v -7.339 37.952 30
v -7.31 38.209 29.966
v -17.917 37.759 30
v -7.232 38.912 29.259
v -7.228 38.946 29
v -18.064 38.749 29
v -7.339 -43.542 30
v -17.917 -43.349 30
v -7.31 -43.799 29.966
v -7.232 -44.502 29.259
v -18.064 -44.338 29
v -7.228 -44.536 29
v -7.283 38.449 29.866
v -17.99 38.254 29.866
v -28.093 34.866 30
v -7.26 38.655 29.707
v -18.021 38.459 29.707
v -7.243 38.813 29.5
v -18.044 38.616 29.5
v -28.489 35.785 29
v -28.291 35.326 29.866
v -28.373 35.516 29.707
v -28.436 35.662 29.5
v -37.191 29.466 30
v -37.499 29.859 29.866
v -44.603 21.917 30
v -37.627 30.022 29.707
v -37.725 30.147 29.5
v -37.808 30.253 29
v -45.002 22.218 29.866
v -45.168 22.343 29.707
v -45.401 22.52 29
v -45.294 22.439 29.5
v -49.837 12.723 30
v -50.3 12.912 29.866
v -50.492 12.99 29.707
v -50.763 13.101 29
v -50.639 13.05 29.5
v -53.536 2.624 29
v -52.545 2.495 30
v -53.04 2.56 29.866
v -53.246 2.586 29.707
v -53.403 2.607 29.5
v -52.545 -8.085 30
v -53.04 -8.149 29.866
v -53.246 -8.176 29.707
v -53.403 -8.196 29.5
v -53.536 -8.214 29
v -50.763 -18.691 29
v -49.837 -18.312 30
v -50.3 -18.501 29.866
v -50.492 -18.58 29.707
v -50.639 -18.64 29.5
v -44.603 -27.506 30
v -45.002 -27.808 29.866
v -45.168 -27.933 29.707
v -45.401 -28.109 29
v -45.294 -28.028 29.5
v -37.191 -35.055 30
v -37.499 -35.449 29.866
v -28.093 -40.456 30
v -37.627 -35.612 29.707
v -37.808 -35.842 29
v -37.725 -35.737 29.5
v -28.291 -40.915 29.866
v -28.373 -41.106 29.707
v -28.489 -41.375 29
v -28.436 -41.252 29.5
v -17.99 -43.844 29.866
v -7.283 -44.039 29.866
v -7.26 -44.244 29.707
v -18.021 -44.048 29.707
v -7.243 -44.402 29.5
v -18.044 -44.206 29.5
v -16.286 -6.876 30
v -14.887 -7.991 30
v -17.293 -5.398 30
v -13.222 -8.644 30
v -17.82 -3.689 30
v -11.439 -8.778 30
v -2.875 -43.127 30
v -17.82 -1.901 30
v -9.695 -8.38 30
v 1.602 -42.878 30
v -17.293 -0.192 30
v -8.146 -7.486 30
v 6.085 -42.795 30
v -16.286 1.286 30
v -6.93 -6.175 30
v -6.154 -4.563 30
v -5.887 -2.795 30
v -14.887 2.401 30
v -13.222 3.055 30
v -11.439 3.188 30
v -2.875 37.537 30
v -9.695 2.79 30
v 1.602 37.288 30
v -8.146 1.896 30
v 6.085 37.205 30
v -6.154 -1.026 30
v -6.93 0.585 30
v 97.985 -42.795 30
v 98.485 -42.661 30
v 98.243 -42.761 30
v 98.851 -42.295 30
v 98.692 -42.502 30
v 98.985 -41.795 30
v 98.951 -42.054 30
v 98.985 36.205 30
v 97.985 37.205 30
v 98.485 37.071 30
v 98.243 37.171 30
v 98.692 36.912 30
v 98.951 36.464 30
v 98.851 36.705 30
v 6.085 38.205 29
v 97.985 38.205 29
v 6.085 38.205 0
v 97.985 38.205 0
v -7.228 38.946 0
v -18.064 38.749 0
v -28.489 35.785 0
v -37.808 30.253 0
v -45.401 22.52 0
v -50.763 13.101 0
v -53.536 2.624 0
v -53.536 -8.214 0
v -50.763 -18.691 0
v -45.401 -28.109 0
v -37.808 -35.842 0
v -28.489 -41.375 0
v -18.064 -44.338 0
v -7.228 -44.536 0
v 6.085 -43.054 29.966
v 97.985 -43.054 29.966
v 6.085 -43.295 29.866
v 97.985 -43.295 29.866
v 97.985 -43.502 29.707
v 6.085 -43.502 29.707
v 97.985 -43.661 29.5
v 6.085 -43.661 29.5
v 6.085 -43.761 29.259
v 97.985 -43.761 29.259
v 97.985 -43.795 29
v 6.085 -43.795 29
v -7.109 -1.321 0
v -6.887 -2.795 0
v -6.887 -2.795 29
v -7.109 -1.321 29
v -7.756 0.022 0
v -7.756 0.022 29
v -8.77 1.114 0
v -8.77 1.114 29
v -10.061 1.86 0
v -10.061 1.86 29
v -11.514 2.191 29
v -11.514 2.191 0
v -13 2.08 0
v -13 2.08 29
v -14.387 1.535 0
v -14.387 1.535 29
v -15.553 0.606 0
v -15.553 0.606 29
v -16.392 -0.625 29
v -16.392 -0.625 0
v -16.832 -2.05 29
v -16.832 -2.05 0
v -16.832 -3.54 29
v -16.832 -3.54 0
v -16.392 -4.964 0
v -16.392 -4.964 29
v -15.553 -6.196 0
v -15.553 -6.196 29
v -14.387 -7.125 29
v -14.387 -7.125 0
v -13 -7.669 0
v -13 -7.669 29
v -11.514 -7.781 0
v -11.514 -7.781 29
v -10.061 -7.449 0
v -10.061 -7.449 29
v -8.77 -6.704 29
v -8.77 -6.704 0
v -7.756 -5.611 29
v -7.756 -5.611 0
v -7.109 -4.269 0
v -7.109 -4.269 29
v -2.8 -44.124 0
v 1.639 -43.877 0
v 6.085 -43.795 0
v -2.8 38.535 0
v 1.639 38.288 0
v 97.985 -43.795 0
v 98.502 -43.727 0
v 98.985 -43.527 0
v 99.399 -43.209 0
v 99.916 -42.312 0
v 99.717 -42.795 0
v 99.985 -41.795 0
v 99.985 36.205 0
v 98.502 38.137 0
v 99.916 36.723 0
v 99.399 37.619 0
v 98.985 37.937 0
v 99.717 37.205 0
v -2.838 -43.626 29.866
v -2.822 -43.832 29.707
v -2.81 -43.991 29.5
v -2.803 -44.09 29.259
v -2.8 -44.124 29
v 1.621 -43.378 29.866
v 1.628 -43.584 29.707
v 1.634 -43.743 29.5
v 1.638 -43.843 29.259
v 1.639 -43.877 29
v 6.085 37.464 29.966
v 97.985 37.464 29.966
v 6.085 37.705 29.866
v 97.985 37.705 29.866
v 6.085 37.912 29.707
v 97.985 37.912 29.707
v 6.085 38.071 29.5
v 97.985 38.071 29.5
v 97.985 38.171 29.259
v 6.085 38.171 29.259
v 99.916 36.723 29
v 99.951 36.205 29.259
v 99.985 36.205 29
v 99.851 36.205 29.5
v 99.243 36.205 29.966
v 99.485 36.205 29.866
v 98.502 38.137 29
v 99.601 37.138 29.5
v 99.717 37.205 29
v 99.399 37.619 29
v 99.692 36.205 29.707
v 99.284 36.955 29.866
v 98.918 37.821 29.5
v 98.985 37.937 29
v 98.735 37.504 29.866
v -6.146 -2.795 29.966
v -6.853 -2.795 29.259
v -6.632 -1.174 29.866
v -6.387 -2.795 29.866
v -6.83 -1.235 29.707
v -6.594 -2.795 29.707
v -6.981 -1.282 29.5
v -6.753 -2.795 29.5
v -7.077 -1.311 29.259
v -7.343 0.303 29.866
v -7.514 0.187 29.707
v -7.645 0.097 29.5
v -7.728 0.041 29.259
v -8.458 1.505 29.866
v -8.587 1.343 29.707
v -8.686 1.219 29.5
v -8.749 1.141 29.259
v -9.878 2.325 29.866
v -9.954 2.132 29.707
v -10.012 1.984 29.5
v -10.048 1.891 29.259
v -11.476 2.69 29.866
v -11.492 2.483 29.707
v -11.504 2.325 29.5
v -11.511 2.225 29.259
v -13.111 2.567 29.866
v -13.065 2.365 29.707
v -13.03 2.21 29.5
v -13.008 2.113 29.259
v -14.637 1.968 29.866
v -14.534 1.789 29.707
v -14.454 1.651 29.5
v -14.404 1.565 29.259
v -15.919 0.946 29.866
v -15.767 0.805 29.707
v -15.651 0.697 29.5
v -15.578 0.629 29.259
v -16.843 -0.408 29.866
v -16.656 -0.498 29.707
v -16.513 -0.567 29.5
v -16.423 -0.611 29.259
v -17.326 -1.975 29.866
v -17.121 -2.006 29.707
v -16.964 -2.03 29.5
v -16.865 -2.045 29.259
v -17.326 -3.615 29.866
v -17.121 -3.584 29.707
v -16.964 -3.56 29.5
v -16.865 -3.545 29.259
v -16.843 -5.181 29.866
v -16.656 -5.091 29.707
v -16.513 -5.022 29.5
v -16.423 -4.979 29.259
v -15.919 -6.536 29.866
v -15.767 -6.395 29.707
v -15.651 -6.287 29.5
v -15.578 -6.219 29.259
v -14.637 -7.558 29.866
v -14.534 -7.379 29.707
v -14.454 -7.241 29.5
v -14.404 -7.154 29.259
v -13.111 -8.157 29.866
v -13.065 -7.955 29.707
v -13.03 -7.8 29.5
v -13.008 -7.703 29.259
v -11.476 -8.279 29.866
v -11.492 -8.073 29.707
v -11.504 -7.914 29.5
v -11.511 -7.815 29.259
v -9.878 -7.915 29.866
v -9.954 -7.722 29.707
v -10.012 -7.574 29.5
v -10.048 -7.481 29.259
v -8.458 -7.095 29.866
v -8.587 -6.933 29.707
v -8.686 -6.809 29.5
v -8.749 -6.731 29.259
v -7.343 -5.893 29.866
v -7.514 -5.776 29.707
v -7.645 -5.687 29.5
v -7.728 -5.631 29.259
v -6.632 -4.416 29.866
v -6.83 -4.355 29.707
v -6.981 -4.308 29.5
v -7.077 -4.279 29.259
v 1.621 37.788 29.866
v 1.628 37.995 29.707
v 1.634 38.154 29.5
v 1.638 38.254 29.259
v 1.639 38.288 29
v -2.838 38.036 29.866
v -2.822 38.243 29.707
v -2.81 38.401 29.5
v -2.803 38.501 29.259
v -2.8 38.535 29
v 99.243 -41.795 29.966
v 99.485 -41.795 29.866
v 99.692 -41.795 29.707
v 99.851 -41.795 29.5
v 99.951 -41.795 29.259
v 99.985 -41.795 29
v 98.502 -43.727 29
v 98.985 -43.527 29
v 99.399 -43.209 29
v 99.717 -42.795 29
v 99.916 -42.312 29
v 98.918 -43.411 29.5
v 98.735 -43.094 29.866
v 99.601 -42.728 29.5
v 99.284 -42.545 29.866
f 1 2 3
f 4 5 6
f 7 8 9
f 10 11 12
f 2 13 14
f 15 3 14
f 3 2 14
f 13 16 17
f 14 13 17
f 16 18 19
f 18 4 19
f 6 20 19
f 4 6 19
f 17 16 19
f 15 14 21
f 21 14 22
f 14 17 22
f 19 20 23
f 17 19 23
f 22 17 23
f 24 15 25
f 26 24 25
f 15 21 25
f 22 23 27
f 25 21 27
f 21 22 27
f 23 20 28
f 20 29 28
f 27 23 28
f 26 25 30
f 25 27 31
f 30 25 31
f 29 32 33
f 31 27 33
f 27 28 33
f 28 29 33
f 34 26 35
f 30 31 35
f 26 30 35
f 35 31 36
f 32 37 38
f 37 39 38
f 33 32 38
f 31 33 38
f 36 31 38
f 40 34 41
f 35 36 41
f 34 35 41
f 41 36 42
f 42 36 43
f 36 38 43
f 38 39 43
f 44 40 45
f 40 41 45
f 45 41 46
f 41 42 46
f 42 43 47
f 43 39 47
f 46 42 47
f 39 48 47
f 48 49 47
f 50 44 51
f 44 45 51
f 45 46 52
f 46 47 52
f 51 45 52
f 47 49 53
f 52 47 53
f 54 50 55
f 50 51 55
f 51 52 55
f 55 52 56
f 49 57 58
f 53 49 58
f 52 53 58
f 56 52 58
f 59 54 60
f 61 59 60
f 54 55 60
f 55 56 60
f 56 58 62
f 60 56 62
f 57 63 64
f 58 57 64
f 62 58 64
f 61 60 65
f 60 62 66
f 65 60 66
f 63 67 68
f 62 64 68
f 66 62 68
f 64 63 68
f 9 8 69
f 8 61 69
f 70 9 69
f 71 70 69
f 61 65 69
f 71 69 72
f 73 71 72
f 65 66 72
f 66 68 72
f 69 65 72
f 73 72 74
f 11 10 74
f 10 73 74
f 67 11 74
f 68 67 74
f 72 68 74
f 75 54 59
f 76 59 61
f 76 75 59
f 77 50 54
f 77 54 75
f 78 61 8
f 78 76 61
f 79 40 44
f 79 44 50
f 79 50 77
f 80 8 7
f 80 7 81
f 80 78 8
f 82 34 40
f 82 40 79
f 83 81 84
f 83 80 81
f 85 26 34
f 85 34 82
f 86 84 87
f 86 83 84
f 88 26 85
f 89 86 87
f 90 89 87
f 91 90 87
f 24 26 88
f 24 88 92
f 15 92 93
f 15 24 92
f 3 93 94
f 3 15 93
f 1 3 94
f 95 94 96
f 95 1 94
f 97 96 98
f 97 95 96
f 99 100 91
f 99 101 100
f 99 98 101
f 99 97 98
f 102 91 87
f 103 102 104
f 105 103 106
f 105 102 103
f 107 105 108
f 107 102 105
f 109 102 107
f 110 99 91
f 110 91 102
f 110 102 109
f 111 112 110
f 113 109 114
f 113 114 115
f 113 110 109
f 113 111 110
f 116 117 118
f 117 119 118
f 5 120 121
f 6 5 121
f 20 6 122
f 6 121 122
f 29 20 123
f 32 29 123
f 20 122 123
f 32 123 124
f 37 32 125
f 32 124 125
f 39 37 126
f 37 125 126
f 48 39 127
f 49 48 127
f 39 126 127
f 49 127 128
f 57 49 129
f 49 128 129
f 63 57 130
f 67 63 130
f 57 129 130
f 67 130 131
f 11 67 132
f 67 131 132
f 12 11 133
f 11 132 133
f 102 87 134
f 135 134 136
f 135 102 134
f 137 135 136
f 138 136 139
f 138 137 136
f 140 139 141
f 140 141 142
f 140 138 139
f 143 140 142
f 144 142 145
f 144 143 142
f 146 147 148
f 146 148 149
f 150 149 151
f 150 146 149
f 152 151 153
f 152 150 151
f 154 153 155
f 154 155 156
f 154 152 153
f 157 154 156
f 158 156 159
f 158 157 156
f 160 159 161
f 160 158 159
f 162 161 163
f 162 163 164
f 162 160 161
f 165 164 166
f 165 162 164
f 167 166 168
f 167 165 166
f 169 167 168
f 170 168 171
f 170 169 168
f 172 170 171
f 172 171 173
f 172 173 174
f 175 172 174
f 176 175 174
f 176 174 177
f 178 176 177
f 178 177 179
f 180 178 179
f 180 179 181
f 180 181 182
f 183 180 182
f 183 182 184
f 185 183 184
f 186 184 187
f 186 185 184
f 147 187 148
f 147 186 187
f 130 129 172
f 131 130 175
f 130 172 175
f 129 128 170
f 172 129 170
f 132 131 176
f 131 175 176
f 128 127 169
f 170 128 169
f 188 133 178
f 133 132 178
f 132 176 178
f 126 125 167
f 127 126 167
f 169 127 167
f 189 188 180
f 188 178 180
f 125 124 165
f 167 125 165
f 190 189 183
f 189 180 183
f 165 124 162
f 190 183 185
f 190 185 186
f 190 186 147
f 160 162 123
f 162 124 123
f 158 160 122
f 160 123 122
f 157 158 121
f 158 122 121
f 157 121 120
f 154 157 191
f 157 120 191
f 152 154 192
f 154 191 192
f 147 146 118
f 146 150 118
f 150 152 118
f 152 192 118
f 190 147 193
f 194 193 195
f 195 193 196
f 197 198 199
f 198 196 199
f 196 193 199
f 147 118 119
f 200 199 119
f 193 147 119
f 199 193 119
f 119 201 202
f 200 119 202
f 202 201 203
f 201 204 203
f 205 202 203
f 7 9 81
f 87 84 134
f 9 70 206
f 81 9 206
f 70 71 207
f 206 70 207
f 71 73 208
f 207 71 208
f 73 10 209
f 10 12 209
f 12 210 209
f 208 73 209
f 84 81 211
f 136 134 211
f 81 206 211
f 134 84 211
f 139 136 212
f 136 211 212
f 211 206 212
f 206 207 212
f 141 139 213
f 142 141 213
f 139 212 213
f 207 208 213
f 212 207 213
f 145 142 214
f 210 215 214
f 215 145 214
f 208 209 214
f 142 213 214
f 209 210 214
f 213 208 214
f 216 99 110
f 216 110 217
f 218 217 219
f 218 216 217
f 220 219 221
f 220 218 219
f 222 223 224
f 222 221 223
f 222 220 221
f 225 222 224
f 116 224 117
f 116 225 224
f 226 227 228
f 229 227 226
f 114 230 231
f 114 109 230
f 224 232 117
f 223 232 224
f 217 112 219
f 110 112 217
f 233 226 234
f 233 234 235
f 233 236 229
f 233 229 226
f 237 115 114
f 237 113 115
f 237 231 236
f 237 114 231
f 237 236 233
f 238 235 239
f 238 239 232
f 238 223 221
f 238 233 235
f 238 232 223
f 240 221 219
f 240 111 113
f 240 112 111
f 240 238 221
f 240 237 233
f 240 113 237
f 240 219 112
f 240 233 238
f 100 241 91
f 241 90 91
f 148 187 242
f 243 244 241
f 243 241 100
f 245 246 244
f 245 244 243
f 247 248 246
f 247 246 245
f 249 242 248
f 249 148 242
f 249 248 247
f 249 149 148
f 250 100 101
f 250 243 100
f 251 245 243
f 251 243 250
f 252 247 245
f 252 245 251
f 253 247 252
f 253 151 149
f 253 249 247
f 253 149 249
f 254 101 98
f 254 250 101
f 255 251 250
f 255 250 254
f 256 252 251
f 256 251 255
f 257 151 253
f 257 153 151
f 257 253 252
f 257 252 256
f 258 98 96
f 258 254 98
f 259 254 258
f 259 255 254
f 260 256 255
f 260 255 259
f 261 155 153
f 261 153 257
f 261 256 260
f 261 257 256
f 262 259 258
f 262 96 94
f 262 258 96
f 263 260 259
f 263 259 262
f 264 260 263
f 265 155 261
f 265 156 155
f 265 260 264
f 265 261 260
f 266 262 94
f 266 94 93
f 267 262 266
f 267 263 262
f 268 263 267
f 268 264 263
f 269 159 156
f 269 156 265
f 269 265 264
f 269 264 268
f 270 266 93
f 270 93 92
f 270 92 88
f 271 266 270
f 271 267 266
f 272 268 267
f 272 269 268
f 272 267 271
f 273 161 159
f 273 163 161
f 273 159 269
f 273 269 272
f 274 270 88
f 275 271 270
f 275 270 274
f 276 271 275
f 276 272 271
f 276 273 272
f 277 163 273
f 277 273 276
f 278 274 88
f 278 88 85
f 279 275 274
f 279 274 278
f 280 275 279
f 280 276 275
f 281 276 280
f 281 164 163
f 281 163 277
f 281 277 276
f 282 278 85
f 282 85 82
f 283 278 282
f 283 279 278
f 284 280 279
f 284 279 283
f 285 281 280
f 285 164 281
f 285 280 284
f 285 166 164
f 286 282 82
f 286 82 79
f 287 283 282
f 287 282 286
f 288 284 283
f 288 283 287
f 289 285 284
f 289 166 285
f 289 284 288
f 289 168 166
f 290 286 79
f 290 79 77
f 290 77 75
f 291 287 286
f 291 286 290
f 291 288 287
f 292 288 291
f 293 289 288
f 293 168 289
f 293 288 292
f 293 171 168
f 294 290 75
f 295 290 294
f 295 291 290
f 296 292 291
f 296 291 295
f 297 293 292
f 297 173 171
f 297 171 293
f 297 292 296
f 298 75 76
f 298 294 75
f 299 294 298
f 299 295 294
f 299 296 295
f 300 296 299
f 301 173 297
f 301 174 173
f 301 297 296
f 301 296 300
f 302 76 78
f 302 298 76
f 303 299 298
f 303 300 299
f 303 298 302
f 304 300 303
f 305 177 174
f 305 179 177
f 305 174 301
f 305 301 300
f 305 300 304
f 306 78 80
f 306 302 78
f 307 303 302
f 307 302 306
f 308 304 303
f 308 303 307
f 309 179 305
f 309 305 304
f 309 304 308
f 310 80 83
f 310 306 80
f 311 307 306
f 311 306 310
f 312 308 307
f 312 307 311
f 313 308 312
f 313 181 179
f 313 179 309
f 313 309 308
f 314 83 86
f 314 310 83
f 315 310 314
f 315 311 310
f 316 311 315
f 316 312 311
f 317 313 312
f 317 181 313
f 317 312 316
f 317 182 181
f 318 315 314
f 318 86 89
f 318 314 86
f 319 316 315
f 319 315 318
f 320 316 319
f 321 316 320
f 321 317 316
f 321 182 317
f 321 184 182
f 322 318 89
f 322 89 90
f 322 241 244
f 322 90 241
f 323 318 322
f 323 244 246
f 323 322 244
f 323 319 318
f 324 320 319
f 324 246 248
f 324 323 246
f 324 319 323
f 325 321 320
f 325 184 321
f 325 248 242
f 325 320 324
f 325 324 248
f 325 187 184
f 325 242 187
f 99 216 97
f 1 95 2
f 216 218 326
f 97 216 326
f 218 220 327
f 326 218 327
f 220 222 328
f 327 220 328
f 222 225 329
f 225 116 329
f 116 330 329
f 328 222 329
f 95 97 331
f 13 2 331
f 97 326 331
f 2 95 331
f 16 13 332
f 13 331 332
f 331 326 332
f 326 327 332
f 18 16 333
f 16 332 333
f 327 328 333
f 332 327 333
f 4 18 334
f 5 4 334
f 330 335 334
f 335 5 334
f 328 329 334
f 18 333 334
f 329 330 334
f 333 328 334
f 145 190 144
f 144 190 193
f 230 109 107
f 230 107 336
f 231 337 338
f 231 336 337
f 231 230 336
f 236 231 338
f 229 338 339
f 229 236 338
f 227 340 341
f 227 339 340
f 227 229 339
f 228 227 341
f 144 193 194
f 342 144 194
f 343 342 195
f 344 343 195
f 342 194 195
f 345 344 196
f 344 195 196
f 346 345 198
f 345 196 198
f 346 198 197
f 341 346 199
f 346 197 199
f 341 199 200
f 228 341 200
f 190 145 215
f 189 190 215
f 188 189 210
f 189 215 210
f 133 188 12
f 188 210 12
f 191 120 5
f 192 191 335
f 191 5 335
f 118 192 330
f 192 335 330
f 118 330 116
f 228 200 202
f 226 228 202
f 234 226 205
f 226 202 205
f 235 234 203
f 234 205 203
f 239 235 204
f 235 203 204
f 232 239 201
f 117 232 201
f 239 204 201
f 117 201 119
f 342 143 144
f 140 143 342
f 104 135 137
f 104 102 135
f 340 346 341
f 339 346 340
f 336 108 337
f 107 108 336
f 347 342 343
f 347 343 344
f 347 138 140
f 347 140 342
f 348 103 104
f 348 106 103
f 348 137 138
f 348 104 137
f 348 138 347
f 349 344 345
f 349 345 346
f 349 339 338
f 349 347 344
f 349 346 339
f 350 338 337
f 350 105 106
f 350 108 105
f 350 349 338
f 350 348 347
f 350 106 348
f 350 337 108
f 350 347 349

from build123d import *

# Parameters (mm, degrees)
SKETCH_1_R      = 5
EXTRUDE_1_DEPTH = 30
FILLET_1_R      = 120
FILLET_2_R      = 1
FILLET_3_R      = 1
FILLET_4_R      = 2


with BuildPart() as part:
    # 草图1 → 凸台-拉伸1 (new body)
    with BuildSketch(Plane.XY):
        with BuildLine():
            Line((-2.776926107, -43.794806673), (99.984598045, -43.794806673))
            Line((99.984598045, -43.794806673), (99.984598045, 38.205193327))
            Line((99.984598045, 38.205193327), (-2.776926107, 38.205193327))
            ThreePointArc((-2.776926107, 38.205193327), (-53.887359686, -2.794806673), (-2.776926107, -43.794806673))
        make_face()
        with Locations((-11.887359686, -2.794806673)):
            Circle(SKETCH_1_R, mode=Mode.SUBTRACT)
    extrude(amount=EXTRUDE_1_DEPTH)

    # 圆角1
    fillet_1_edges = [part.edges().sort_by_distance(p)[0] for p in [
        (-2.776926107, 38.205193327, 15),
        (-2.776926107, -43.794806673, 15),
    ]]
    fillet(fillet_1_edges, radius=FILLET_1_R)

    # 圆角2
    fillet_2_edges = [part.edges().sort_by_distance(p)[0] for p in [
        (-16.887359686, -2.794806673, 30),
    ]]
    fillet(fillet_2_edges, radius=FILLET_2_R)

    # 圆角3
    fillet_3_edges = [part.edges().sort_by_distance(p)[0] for p in [
        (99.984598045, -2.794806673, 30),
        (-53.887359686, -2.794806673, 30),
        (53.034719557, 38.205193327, 30),
        (53.034719557, -43.794806673, 30),
        (-0.581825597, 38.390521623, 30),
        (-0.581825597, -43.980134969, 30),
    ]]
    fillet(fillet_3_edges, radius=FILLET_3_R)

    # 圆角4
    # the kernel refuses this fillet: 2 mm, written as the material it takes off along each edge
    with BuildSketch(Plane(origin=(97.984598045, -41.794806673, 30), x_dir=(0, -1, 0), z_dir=(-1, 0, 0))) as fillet_4_piece_1:
        with BuildLine():
            CenterArc((1, -1), 1, 0, 90)
            Line((2, -1), (2, 0))
            Line((2, 0), (1, 0))
        make_face()
    revolve(axis=Axis((97.984598045, -41.794806673, 30), (0, 0, 1)), revolution_arc=90, mode=Mode.SUBTRACT)
    with BuildSketch(Plane(origin=(97.984598045, 36.205193327, 30), x_dir=(1, 0, 0), z_dir=(0, -1, 0))) as fillet_4_piece_2:
        with BuildLine():
            CenterArc((1, -1), 1, 0, 90)
            Line((2, -1), (2, 0))
            Line((2, 0), (1, 0))
        make_face()
    revolve(axis=Axis((97.984598045, 36.205193327, 30), (0, 0, 1)), revolution_arc=90, mode=Mode.SUBTRACT)
    with BuildSketch(Plane(origin=(99.984598045, 38.205193327, -5), x_dir=(0, -1, 0), z_dir=(0, 0, 1))) as fillet_4_piece_3:
        with BuildLine():
            CenterArc((FILLET_4_R, -FILLET_4_R), FILLET_4_R, 90, 90)
            Line((0, -FILLET_4_R), (0, 0))
            Line((0, 0), (FILLET_4_R, 0))
        make_face()
    extrude(amount=35, mode=Mode.SUBTRACT)
    with BuildSketch(Plane(origin=(99.984598045, -43.794806673, -5), x_dir=(0, 1, 0), z_dir=(0, 0, 1))) as fillet_4_piece_4:
        with BuildLine():
            CenterArc((FILLET_4_R, FILLET_4_R), FILLET_4_R, 180, 90)
            Line((0, FILLET_4_R), (0, 0))
            Line((0, 0), (FILLET_4_R, 0))
        make_face()
    extrude(amount=35, mode=Mode.SUBTRACT)


solid = part.part
